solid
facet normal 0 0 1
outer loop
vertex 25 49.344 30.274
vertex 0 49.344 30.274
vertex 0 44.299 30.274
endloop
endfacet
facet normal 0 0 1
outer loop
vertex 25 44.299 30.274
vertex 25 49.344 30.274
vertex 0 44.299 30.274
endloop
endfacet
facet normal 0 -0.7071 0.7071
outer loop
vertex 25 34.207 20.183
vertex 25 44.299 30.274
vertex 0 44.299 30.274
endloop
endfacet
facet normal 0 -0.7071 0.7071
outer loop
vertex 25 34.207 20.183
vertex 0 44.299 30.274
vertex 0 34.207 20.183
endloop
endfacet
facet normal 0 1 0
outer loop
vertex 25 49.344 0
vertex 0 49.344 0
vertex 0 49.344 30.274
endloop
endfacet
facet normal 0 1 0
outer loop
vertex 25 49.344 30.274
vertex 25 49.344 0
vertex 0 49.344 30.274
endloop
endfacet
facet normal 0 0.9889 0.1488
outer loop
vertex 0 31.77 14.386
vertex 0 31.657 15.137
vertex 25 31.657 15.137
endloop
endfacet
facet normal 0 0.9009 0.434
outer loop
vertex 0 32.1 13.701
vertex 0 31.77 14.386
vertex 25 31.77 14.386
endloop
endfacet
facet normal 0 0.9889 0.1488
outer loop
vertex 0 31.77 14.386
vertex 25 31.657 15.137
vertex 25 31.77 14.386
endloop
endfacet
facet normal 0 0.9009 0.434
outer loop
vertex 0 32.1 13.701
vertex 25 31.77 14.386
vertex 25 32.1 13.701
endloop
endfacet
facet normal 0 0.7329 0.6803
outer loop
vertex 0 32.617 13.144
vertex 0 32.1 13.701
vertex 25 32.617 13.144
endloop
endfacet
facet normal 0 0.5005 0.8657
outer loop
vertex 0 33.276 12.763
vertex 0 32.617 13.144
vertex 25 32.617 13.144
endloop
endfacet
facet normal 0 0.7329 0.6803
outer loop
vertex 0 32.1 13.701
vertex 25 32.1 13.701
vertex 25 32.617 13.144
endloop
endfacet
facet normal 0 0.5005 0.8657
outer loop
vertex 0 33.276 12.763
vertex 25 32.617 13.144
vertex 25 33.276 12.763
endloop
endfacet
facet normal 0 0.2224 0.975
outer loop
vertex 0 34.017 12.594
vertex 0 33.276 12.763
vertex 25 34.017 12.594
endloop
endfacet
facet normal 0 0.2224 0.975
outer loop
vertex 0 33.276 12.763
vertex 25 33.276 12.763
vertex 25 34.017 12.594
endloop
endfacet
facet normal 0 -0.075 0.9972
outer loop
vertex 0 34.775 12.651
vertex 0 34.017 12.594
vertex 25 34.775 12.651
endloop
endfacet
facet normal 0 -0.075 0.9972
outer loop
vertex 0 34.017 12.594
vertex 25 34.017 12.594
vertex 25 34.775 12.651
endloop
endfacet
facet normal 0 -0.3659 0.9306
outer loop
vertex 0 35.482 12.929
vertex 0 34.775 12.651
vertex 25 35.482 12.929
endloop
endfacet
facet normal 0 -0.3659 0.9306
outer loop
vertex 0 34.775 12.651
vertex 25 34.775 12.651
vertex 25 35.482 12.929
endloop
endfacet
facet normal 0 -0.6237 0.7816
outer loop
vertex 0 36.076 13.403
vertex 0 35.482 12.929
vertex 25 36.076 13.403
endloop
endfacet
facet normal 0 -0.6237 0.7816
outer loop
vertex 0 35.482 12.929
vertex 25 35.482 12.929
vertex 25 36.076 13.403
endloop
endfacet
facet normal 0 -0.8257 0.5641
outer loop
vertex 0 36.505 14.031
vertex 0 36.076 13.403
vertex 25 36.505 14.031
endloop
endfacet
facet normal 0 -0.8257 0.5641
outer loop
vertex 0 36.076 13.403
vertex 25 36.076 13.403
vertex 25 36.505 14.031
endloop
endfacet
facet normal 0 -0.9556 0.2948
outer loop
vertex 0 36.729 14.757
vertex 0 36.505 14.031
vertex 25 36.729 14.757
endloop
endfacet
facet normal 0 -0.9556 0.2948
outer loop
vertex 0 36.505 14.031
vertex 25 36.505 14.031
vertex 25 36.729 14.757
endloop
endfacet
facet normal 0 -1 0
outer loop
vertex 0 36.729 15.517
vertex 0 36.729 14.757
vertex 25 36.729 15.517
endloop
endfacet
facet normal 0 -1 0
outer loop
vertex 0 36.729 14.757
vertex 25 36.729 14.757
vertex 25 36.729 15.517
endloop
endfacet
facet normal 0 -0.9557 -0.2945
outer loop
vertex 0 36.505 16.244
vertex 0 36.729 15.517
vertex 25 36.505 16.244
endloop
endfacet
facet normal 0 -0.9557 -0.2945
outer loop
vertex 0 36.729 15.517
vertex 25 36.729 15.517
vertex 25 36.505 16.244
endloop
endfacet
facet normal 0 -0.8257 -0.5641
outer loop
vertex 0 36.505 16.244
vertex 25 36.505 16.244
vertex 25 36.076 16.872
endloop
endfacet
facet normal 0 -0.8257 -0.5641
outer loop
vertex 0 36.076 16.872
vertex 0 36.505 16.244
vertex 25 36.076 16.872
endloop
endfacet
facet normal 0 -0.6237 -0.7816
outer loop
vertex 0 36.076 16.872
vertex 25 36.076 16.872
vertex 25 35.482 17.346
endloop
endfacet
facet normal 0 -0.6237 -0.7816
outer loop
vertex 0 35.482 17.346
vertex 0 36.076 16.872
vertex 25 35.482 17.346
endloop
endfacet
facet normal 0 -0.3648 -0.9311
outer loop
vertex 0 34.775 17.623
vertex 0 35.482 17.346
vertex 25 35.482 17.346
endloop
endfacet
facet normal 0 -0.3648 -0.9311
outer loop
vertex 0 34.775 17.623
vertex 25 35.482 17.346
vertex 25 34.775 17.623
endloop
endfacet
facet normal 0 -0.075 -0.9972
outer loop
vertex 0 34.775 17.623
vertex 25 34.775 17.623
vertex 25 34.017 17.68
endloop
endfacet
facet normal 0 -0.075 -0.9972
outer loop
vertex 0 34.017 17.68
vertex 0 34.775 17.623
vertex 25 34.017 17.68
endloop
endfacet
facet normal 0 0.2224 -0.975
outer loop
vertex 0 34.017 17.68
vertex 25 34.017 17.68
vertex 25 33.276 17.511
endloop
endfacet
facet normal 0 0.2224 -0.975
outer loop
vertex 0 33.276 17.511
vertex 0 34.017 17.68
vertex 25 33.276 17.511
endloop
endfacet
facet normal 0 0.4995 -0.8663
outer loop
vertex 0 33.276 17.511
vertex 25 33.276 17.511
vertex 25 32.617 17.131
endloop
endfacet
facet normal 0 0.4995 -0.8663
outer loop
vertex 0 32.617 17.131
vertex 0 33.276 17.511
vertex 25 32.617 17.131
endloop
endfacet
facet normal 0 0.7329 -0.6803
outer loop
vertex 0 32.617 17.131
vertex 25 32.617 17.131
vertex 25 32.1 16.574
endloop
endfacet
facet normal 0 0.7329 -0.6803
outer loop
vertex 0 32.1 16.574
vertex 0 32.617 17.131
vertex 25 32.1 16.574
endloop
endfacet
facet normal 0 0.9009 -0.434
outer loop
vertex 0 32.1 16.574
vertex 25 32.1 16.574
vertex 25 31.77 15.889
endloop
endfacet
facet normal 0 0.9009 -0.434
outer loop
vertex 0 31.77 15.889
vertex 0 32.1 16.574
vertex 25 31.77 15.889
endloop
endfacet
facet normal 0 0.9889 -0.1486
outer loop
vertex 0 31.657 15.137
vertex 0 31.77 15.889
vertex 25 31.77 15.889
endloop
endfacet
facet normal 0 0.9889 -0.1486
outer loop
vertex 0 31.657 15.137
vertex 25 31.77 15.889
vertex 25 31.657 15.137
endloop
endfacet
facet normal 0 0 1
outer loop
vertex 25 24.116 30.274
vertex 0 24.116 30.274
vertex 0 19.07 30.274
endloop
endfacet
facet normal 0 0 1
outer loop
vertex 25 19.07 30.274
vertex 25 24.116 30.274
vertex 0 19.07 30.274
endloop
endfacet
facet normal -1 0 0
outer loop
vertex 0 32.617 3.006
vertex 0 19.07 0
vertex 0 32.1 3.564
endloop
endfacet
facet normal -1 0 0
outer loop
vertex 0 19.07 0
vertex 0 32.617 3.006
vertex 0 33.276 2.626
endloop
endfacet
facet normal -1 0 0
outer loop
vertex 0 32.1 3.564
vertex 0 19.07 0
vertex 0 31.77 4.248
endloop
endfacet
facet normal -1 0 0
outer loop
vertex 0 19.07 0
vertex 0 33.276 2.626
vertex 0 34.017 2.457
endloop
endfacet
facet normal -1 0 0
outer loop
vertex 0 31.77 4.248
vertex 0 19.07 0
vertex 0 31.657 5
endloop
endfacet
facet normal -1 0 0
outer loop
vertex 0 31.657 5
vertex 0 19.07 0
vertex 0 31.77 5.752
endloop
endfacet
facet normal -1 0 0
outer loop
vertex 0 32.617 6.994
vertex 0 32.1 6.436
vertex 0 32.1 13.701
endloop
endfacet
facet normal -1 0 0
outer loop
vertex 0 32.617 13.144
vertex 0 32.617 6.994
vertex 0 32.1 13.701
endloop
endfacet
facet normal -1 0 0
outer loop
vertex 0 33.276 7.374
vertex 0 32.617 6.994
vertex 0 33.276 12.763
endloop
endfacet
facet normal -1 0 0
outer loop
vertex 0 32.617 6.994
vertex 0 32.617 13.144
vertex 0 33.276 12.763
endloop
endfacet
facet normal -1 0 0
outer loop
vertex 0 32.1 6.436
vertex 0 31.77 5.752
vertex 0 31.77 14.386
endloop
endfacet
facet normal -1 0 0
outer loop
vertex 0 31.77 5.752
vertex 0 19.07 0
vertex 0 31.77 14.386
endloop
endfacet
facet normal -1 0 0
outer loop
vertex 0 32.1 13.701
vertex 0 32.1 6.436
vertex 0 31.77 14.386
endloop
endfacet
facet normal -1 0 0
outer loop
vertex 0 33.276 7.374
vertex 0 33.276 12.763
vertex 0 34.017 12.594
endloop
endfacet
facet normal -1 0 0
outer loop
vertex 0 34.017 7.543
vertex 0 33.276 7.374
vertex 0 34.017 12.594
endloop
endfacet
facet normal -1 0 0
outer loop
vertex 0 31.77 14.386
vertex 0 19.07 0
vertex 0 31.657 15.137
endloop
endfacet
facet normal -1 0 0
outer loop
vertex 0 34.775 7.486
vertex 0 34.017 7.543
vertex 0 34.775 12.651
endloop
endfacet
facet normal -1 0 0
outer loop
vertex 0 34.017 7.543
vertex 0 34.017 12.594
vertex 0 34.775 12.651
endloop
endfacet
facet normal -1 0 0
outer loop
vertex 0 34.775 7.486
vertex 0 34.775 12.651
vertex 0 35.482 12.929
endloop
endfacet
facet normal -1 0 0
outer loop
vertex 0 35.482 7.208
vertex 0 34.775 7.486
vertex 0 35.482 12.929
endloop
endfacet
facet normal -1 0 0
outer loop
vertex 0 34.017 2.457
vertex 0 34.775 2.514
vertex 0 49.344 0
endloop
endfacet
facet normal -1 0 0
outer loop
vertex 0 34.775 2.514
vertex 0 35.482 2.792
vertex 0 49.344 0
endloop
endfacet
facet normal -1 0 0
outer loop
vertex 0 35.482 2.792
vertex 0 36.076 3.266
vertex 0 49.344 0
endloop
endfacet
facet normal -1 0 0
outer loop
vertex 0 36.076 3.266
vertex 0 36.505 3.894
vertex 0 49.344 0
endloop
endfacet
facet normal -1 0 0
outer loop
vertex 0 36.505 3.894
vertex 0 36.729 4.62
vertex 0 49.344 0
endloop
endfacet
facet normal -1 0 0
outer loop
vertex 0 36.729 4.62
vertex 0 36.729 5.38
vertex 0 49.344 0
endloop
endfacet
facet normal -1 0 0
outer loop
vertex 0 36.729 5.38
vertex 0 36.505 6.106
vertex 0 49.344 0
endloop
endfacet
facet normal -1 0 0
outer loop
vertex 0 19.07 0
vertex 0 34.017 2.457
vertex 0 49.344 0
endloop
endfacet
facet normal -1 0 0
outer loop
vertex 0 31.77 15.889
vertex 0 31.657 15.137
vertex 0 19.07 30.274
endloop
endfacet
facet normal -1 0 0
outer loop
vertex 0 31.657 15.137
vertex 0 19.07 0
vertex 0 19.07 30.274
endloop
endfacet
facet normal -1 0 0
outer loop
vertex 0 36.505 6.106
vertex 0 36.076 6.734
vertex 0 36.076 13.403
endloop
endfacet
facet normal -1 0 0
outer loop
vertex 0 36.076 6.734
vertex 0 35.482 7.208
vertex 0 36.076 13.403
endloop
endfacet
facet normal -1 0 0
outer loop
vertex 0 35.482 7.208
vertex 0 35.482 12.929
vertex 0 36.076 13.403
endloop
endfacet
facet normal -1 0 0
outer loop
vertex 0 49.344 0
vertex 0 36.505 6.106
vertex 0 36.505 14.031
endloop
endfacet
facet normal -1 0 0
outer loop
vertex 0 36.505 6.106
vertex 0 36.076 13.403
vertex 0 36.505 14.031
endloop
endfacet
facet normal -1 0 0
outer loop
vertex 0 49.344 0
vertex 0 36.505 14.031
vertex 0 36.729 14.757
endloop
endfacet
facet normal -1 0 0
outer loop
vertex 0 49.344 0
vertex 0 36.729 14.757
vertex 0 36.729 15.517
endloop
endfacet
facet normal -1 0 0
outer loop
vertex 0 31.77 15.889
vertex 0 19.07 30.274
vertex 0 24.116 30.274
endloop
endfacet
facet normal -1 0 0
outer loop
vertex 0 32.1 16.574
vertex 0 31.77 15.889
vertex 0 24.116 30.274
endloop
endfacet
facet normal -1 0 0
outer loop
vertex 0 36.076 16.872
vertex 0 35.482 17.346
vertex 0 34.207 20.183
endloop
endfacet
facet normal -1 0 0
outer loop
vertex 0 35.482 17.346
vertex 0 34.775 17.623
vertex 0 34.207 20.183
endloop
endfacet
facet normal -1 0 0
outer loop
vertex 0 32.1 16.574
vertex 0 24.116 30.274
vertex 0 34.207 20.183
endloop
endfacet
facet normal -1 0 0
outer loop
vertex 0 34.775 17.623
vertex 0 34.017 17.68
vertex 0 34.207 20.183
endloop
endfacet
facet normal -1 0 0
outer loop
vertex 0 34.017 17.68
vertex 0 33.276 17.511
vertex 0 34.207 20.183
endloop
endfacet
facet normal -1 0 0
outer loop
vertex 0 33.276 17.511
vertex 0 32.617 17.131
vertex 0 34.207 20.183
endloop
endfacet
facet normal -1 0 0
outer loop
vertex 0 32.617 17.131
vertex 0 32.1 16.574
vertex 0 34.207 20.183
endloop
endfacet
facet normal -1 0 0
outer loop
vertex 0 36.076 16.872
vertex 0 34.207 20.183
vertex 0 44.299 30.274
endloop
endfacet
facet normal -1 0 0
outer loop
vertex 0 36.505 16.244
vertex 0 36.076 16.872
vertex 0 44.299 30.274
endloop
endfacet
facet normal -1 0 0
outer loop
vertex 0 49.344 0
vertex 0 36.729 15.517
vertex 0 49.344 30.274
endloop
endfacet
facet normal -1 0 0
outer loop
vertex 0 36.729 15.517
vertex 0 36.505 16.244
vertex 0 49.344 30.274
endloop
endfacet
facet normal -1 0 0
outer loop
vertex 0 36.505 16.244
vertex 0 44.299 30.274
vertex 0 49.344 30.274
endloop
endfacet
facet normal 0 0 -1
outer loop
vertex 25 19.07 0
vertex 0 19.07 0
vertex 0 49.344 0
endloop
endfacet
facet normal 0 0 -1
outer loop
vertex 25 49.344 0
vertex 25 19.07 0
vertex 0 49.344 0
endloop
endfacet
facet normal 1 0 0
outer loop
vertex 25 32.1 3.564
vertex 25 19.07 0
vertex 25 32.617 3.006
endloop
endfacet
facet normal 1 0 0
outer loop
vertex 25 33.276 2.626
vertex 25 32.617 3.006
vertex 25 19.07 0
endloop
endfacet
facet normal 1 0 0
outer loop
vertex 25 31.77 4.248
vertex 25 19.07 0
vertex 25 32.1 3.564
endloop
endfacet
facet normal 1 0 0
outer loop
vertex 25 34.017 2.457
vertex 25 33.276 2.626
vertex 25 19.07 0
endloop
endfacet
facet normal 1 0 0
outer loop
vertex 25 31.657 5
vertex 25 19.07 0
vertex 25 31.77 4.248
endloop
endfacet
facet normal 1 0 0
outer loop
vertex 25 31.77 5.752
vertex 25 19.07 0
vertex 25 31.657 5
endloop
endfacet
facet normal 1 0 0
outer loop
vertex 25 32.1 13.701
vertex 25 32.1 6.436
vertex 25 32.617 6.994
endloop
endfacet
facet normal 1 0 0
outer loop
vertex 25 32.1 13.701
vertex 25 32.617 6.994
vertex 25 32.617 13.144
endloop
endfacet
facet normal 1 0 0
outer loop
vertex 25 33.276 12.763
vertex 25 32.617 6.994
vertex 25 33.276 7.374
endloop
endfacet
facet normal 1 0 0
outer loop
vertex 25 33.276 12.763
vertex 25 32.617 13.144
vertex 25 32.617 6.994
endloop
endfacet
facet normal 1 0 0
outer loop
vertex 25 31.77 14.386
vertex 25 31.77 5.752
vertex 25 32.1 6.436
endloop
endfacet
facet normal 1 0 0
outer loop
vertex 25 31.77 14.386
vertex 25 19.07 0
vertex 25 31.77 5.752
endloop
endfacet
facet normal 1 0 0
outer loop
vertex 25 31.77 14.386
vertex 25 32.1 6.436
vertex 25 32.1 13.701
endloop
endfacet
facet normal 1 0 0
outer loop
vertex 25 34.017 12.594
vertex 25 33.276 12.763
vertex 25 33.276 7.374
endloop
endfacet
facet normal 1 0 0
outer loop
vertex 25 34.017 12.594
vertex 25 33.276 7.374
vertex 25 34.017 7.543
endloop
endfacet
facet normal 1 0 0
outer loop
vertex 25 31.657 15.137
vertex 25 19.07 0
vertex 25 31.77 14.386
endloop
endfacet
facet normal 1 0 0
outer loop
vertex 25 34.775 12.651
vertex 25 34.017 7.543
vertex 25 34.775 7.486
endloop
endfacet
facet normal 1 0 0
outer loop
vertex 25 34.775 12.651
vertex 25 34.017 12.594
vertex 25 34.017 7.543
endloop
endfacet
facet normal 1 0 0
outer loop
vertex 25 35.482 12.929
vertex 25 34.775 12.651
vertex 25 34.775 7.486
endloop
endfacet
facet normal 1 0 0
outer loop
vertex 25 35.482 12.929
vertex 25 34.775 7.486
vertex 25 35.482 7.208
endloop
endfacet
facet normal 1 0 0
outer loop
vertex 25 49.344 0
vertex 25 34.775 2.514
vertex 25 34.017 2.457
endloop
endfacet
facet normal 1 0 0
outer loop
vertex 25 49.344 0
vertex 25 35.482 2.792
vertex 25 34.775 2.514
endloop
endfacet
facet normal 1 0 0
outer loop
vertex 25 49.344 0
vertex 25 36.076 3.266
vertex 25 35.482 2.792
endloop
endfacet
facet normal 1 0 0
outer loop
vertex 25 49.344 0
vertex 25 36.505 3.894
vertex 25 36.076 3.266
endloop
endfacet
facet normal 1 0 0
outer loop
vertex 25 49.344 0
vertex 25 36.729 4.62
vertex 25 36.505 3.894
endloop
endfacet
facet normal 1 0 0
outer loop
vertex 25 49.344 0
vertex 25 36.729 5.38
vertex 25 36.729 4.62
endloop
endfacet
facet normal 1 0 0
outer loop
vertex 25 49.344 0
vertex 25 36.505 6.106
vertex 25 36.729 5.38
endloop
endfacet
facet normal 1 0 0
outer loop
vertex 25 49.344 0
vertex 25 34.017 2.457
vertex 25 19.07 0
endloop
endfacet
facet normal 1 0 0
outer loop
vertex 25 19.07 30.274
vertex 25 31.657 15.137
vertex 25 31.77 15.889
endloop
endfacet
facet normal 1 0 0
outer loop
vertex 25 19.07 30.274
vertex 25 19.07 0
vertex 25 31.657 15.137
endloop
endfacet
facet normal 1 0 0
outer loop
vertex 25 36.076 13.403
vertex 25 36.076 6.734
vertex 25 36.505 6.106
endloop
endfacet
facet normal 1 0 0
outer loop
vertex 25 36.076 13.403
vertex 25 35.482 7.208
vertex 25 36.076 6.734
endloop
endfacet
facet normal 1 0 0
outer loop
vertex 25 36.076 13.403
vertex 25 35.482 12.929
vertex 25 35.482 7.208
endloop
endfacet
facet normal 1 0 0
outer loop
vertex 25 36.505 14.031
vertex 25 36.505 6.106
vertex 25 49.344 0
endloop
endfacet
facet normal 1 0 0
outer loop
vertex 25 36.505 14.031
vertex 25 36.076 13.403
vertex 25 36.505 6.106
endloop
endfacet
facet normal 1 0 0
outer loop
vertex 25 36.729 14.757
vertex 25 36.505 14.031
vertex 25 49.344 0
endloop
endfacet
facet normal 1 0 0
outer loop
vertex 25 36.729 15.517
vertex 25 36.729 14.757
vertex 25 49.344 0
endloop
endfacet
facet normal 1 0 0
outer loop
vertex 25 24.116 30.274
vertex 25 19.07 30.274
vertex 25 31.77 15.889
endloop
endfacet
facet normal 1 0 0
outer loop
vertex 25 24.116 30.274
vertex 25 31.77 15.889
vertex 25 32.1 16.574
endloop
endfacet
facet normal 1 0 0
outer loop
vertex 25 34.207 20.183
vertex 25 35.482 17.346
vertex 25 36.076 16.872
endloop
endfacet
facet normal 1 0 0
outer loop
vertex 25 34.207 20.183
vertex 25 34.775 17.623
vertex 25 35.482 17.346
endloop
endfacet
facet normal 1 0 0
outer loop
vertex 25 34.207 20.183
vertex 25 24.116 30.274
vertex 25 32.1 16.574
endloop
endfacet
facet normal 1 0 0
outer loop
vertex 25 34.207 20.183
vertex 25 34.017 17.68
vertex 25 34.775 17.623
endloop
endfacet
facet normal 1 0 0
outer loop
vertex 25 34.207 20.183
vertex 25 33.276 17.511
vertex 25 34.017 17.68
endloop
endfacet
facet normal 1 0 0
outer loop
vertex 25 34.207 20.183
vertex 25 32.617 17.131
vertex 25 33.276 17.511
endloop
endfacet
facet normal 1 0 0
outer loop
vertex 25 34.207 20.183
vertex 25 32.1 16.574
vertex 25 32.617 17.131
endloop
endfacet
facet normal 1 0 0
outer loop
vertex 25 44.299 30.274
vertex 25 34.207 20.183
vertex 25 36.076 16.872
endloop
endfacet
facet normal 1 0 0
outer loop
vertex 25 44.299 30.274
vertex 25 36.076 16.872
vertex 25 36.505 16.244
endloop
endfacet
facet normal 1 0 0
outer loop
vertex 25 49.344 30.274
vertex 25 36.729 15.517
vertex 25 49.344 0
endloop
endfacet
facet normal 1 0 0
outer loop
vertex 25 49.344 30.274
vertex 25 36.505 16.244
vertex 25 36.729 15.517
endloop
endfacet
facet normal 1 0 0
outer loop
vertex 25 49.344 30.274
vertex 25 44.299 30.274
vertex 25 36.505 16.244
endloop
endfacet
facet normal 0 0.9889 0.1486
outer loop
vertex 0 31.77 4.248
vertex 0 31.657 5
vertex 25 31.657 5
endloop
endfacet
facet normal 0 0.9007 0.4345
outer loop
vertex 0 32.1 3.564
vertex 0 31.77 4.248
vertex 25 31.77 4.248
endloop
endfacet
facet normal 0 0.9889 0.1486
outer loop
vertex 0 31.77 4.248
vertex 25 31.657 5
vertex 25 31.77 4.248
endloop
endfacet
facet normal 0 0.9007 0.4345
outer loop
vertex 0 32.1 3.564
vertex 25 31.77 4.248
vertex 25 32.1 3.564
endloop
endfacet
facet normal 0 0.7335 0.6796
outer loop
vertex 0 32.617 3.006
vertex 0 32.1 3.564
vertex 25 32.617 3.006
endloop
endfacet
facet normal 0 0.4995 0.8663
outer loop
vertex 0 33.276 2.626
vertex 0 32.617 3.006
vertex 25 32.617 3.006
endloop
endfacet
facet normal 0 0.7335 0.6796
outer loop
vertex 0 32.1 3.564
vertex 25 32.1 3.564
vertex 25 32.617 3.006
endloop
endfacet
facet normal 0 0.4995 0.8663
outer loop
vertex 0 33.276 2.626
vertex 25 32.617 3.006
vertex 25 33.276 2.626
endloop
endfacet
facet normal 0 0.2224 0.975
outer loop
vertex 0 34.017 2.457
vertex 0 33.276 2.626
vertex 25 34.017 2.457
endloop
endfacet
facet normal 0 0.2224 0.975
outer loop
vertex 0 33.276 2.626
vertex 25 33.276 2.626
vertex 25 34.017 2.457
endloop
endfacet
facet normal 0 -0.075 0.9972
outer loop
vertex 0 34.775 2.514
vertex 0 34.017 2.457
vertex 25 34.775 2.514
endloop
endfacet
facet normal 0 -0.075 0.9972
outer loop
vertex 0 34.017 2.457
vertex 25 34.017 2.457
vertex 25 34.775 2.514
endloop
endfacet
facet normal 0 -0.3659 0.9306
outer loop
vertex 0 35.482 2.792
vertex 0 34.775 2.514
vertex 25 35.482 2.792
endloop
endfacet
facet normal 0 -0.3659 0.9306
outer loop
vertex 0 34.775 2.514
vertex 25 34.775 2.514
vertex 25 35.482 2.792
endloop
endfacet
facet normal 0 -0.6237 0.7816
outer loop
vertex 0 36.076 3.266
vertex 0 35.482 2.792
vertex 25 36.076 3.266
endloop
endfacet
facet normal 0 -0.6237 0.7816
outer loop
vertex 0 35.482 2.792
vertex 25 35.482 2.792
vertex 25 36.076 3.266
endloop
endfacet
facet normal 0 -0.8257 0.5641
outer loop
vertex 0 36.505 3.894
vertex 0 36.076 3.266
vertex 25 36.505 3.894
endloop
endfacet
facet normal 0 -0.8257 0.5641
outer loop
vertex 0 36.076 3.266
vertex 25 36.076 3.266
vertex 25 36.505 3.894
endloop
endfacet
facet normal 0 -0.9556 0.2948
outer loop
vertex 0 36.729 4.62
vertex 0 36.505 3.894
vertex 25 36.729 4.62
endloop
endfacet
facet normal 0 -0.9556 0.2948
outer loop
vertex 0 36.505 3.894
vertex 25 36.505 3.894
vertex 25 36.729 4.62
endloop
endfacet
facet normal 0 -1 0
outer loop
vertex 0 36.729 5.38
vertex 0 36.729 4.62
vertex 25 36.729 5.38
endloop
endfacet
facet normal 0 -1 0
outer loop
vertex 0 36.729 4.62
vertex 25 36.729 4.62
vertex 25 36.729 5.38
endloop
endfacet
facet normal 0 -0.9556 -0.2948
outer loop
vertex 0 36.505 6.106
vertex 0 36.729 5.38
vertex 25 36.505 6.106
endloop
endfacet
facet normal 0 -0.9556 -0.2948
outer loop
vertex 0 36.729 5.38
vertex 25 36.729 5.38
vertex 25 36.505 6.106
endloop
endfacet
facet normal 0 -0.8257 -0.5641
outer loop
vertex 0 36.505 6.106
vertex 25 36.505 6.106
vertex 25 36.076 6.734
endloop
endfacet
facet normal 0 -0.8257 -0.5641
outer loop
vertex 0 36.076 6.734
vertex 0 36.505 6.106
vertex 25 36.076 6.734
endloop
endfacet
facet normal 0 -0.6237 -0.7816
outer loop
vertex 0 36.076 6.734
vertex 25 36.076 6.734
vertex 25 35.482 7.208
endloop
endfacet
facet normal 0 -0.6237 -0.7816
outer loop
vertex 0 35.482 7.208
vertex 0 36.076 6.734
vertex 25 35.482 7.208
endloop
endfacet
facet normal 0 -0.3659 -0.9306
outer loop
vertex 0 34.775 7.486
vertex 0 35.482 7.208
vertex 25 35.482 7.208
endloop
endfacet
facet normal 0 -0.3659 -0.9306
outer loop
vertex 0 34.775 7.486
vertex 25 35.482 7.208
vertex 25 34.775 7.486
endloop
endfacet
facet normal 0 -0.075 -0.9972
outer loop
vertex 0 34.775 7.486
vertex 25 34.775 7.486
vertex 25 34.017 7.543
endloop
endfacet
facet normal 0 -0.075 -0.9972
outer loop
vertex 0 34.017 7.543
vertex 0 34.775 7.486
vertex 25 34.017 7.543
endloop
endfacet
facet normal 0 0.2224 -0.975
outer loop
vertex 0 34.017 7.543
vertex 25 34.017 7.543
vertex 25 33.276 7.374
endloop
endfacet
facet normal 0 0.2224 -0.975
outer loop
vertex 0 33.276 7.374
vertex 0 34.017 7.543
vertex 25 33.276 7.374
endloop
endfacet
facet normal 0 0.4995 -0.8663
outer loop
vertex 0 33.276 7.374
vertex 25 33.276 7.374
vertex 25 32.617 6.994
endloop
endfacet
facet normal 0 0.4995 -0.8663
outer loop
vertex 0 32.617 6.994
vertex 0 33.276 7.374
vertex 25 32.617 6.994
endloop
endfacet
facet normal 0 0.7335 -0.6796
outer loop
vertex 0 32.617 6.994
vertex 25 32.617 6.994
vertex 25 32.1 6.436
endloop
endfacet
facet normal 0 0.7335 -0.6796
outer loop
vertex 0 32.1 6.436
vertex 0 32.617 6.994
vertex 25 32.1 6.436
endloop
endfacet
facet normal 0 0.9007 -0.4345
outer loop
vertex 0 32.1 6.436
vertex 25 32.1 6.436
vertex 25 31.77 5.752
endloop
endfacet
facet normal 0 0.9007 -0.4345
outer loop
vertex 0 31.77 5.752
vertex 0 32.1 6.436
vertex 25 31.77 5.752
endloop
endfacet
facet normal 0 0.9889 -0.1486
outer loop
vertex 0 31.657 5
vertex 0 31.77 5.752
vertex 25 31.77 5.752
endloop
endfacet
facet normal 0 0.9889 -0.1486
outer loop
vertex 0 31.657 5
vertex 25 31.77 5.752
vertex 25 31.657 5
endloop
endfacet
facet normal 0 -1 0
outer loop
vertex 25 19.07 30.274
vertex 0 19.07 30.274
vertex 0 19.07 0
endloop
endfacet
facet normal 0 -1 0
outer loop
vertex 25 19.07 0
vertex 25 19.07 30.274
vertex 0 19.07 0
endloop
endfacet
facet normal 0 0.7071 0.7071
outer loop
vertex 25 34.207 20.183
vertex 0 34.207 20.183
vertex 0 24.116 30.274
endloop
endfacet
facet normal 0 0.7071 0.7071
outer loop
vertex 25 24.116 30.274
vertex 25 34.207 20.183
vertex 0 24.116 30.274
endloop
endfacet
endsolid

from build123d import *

# Parameters (mm, degrees)
F1_DEPTH = 25
F2_D     = 5.1


# Not quite as in the source:
# - a feature names something its author has since deleted; it is built from what else it names


with BuildPart() as f1:
    # F0 (on Right) → F1 (new body)
    with BuildSketch(Plane.YZ):
        Polygon((24.1157077886, 30.274353966), (19.0699821276, 30.274353966), (19.0699821276, 0), (49.3443360936, 0), (49.3443360936, 30.274353966), (44.2986104326, 30.274353966), (34.2071591106, 20.182902644), align=None)
    extrude(amount=F1_DEPTH)

    # F2 (through all)
    with Locations(Plane(origin=(0, 0, 0), x_dir=(0, 1, 0), z_dir=(-1, 0, 0))):
        with Locations((34.2071591106, -5), (34.2071591106, -15.137176983)):
            Hole(F2_D / 2)


solid = f1.part
